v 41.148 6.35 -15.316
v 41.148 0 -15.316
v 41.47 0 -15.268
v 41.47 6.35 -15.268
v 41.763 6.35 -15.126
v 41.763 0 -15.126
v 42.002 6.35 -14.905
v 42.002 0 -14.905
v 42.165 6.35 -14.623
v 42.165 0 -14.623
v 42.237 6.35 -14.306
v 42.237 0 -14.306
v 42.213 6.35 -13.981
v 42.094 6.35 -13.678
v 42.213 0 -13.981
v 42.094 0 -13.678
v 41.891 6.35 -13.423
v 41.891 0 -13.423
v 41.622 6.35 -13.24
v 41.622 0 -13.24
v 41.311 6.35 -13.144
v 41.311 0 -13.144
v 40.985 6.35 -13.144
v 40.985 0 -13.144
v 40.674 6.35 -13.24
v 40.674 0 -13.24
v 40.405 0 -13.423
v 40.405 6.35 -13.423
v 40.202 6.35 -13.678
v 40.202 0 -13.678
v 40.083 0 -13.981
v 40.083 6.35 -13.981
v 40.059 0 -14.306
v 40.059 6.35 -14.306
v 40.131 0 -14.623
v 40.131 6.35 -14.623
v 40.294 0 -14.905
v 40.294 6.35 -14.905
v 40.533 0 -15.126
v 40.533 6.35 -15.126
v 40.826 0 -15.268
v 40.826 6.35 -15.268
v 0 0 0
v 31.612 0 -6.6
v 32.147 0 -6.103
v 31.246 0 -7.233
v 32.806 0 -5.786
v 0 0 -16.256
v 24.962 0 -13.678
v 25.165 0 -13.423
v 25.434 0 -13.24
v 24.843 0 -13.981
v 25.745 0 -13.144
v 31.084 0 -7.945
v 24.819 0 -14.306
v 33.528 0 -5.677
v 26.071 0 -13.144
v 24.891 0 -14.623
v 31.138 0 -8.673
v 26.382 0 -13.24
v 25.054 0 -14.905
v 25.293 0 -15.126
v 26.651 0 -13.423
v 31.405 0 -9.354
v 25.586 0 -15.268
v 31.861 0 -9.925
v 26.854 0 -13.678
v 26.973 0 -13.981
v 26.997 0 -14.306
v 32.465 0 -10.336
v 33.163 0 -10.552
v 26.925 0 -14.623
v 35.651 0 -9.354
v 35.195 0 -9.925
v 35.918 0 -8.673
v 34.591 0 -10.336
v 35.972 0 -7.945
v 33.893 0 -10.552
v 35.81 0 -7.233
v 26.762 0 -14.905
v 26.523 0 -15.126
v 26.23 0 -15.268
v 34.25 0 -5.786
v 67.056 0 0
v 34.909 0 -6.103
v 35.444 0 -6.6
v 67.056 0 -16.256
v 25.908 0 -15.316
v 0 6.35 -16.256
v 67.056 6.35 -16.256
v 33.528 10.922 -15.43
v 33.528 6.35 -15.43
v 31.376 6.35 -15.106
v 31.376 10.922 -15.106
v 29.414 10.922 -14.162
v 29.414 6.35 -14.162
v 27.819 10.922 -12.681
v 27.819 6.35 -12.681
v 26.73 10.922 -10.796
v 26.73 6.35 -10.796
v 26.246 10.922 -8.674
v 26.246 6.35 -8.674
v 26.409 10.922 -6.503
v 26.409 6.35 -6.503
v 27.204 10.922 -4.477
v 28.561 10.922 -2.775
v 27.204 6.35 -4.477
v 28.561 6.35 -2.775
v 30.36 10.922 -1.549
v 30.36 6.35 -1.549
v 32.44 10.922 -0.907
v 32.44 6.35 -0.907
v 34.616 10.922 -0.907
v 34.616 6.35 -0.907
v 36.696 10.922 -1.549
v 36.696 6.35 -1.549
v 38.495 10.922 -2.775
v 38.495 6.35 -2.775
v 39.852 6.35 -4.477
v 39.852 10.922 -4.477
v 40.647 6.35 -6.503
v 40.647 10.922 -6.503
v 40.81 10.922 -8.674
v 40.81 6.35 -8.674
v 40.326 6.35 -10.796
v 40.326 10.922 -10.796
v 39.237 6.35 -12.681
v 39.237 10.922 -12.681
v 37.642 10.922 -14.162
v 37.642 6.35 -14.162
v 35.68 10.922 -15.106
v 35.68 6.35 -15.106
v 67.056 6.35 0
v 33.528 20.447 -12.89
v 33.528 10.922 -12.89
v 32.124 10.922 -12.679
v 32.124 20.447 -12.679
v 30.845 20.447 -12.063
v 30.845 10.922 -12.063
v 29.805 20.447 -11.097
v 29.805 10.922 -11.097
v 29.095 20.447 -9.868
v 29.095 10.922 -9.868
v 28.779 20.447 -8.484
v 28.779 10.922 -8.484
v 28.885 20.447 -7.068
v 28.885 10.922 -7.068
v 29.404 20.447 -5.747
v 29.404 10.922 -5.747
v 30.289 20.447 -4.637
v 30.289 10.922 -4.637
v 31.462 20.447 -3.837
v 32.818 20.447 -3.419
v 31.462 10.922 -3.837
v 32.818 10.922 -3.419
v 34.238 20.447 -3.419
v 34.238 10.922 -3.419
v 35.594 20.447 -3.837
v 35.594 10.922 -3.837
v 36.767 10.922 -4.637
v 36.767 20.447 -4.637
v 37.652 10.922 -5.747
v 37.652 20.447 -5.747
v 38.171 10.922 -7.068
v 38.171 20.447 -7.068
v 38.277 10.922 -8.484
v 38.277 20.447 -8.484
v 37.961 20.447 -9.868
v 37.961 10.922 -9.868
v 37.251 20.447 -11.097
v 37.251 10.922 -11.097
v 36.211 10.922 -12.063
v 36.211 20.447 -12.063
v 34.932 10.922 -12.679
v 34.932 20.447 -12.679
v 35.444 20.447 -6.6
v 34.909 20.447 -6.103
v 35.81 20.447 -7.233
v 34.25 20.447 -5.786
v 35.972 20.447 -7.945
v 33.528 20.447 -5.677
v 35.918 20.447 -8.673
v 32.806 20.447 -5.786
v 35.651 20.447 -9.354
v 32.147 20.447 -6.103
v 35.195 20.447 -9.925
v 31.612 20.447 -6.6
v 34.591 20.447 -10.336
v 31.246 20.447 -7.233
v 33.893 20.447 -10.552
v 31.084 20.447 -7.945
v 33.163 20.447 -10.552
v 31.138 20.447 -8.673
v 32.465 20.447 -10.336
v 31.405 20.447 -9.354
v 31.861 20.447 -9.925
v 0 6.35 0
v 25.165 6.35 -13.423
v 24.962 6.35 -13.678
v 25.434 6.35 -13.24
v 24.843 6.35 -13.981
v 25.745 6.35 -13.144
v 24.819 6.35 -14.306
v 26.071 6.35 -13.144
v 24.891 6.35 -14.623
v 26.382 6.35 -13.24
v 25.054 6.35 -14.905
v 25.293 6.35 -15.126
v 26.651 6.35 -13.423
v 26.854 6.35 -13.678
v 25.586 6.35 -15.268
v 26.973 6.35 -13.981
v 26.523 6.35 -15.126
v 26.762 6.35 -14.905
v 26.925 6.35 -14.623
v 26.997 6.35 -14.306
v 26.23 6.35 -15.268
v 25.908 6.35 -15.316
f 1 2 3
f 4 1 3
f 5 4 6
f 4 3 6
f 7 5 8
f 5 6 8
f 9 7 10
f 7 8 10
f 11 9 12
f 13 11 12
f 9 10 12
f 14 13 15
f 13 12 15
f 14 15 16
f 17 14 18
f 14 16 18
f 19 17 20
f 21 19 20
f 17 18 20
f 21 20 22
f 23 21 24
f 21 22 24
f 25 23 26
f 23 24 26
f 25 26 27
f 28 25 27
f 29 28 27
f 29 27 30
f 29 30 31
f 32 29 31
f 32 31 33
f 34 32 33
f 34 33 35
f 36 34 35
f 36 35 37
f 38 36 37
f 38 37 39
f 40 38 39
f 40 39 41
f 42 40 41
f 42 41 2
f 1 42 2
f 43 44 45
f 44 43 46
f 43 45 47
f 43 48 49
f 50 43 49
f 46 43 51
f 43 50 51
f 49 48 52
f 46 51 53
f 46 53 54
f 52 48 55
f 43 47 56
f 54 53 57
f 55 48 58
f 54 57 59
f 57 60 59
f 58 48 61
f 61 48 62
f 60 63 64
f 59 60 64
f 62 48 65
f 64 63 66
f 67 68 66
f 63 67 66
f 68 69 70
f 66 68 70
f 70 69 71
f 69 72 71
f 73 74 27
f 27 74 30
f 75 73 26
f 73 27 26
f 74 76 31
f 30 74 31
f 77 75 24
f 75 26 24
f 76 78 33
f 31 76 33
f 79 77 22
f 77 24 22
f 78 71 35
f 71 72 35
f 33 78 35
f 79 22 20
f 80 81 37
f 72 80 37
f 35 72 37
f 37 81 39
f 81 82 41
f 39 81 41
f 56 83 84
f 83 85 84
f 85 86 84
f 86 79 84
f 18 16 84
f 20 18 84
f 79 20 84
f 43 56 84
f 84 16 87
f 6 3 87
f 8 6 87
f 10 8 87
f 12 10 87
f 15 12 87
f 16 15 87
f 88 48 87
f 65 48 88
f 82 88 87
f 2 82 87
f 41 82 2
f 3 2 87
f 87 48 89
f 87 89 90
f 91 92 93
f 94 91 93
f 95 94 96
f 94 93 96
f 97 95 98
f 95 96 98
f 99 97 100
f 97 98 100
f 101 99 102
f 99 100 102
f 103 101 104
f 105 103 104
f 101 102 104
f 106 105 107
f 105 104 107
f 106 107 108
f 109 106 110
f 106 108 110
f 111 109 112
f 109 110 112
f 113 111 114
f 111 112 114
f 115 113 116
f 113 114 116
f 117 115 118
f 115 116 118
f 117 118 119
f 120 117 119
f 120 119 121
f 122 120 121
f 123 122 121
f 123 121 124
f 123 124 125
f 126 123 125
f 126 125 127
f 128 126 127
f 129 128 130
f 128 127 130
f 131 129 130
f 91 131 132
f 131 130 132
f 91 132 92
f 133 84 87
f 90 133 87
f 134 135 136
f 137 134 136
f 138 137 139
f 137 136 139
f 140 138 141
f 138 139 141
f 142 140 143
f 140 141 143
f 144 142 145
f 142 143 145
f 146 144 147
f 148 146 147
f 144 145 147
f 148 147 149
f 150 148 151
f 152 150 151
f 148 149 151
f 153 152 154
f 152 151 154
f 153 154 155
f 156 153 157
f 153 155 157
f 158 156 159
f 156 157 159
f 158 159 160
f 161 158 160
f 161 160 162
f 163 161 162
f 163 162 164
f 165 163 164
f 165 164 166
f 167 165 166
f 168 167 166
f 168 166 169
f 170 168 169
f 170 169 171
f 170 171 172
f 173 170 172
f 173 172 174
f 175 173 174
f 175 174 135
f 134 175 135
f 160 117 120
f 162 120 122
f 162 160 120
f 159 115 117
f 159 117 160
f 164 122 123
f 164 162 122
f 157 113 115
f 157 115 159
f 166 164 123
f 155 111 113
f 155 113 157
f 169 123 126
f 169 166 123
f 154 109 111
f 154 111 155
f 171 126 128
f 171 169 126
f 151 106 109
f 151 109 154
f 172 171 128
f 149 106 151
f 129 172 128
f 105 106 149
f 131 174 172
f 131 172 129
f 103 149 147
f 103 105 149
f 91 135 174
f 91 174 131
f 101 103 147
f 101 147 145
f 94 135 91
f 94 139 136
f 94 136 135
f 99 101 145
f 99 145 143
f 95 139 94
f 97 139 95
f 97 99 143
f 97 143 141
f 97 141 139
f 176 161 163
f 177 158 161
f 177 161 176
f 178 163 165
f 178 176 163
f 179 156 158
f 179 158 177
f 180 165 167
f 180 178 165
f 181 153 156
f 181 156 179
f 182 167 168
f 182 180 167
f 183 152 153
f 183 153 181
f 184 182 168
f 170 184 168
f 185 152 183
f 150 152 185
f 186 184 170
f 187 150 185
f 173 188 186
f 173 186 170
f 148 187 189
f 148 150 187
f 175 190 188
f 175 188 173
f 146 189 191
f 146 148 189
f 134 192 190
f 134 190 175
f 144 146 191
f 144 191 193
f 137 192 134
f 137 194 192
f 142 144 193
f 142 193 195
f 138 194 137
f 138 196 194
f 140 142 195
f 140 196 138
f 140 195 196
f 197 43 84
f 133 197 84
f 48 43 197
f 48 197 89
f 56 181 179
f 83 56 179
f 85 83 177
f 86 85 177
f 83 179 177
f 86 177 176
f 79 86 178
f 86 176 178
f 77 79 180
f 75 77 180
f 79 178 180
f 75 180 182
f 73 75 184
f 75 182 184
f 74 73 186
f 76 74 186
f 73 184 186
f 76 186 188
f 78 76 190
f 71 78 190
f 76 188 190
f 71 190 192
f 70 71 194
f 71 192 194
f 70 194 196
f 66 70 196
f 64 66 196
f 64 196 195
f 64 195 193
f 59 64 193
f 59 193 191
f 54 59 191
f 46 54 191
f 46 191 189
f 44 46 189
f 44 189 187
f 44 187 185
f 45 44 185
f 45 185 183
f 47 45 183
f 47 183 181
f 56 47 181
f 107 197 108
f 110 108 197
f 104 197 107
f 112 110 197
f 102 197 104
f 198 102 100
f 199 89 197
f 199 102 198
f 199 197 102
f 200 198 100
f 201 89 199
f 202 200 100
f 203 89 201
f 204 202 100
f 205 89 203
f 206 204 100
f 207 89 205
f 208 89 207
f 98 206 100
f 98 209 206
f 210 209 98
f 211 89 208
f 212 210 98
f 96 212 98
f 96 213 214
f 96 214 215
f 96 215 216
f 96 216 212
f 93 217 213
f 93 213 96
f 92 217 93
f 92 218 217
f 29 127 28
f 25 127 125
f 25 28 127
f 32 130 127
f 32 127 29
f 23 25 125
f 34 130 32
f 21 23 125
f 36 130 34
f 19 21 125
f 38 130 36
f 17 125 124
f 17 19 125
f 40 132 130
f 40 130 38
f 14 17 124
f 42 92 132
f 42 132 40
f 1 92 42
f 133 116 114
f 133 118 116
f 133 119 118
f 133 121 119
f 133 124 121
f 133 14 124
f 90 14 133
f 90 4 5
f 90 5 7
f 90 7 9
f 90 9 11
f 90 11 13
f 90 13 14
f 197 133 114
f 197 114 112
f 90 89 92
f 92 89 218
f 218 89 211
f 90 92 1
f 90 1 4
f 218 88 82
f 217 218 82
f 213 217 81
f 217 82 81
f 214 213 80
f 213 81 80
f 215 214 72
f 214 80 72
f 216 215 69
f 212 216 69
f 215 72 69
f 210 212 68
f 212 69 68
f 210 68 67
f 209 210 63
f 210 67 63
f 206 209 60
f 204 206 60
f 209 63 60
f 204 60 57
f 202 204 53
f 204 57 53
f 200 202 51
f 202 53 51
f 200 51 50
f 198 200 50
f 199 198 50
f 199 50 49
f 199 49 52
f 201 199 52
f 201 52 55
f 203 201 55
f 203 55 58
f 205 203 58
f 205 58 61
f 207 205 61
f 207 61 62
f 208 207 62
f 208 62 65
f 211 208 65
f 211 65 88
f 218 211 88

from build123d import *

# Parameters (mm, degrees)
SKETCH1_W           = 67.056
SKETCH1_H           = 16.256
BOSS_EXTRUDE1_DEPTH = 6.35
SKETCH2_R           = 4.7625
BOSS_EXTRUDE2_DEPTH = 14.097
SKETCH3_R           = 2.4511
CUT_EXTRUDE1_DEPTH  = 72.964188879
CUT_EXTRUDE2_REACH  = 73.964
SKETCH4_R           = 1.0922
SKETCH6_R           = 7.3025
SKETCH6_R_2         = 4.7625
BOSS_EXTRUDE3_DEPTH = 4.572


with BuildPart() as part:
    # Sketch1 → Boss-Extrude1 (new body)
    with BuildSketch(Plane(origin=(0, 0, 0), x_dir=(1, 0, 0), z_dir=(0, 1, 0))):
        with Locations((33.528, 8.128)):
            Rectangle(SKETCH1_W, SKETCH1_H)
    extrude(amount=BOSS_EXTRUDE1_DEPTH)

    # Sketch2 → Boss-Extrude2 (add)
    with BuildSketch(Plane(origin=(0, 6.35, 0), x_dir=(1, 0, 0), z_dir=(0, 1, 0))):
        with Locations(Location((33.528, 8.128, 0), (0, 0, 90))):
            Circle(SKETCH2_R)
    extrude(amount=BOSS_EXTRUDE2_DEPTH)

    # Sketch3 → Cut-Extrude1 (cut, through all)
    with BuildSketch(Plane(origin=(0, 20.447, 0), x_dir=(1, 0, 0), z_dir=(0, 1, 0))):
        with Locations(Location((33.528, 8.128, 0), (0, 0, 270))):
            Circle(SKETCH3_R)
    extrude(amount=-CUT_EXTRUDE1_DEPTH, mode=Mode.SUBTRACT)

    # Sketch4 → Cut-Extrude2 (cut, up to next)
    with BuildSketch(Plane(origin=(0, 0, 0), x_dir=(-1, 0, 0), z_dir=(0, -1, 0)), mode=Mode.PRIVATE) as cut_extrude2_sk1:
        with Locations(Location((-25.908, 14.224, 0), (0, 0, 90))):
            Circle(SKETCH4_R)
    cut_extrude2_tool1 = extrude(cut_extrude2_sk1.sketch, amount=-CUT_EXTRUDE2_REACH, mode=Mode.PRIVATE) & part.part
    # Sketch4 → Cut-Extrude2 (cut, up to next)
    with BuildSketch(Plane(origin=(0, 0, 0), x_dir=(-1, 0, 0), z_dir=(0, -1, 0)), mode=Mode.PRIVATE) as cut_extrude2_sk2:
        with Locations(Location((-41.148, 14.224, 0), (0, 0, 90))):
            Circle(SKETCH4_R)
    cut_extrude2_tool2 = extrude(cut_extrude2_sk2.sketch, amount=-CUT_EXTRUDE2_REACH, mode=Mode.PRIVATE) & part.part
    add(cut_extrude2_tool1.solids().sort_by_distance((25.908, 0, -14.224))[0], mode=Mode.SUBTRACT)
    add(cut_extrude2_tool2.solids().sort_by_distance((41.148, 0, -14.224))[0], mode=Mode.SUBTRACT)

    # Sketch6 → Boss-Extrude3 (add)
    with BuildSketch(Plane(origin=(0, 6.35, 0), x_dir=(1, 0, 0), z_dir=(0, 1, 0))):
        with Locations(Location((33.528, 8.128, 0), (0, 0, 90))):
            Circle(SKETCH6_R)
        with Locations(Location((33.528, 8.128, 0), (0, 0, 270))):
            Circle(SKETCH6_R_2, mode=Mode.SUBTRACT)
    extrude(amount=BOSS_EXTRUDE3_DEPTH)


solid = part.part
